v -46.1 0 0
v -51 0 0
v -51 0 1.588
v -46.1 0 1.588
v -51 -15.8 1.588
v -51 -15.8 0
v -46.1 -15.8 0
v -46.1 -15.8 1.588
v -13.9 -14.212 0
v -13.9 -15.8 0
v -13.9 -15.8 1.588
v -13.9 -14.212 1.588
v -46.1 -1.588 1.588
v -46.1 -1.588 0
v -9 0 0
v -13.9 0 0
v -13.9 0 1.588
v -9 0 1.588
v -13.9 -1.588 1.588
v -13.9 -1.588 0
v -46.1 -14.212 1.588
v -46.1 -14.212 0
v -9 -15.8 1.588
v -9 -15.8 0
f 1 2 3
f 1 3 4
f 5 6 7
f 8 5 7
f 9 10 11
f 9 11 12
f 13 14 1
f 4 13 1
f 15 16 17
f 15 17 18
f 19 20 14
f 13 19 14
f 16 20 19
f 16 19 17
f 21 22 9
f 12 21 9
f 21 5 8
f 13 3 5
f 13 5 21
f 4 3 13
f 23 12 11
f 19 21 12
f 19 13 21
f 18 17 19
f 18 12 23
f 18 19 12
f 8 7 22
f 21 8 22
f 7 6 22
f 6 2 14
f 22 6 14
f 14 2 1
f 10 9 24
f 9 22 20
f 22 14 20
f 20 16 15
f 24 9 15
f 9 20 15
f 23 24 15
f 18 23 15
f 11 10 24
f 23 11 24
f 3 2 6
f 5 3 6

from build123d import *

# Parameters (mm, degrees)
SKETCH2_W           = 4.9
SKETCH2_H           = 1.5875
BOSS_EXTRUDE1_DEPTH = 1.5875


with BuildPart() as part:
    # Sketch2 → Boss-Extrude1 (new body)
    with BuildSketch(Plane.XY):
        Polygon((-9, -7.9), (-51, -7.9), (-51, -14.2125), (-46.1, -14.2125), (-13.9, -14.2125), (-9, -14.2125), align=None)
        with Locations((-48.55, -15.00625)):
            Rectangle(SKETCH2_W, SKETCH2_H)
        Polygon((-13.9, -1.5875), (-46.1, -1.5875), (-51, -1.5875), (-51, -7.9), (-9, -7.9), (-9, -1.5875), align=None)
        with Locations((-48.55, -0.79375)):
            Rectangle(SKETCH2_W, SKETCH2_H)
        with Locations((-11.45, -0.79375)):
            Rectangle(SKETCH2_W, SKETCH2_H)
        with Locations((-11.45, -15.00625)):
            Rectangle(SKETCH2_W, SKETCH2_H)
    extrude(amount=BOSS_EXTRUDE1_DEPTH)


solid = part.part
